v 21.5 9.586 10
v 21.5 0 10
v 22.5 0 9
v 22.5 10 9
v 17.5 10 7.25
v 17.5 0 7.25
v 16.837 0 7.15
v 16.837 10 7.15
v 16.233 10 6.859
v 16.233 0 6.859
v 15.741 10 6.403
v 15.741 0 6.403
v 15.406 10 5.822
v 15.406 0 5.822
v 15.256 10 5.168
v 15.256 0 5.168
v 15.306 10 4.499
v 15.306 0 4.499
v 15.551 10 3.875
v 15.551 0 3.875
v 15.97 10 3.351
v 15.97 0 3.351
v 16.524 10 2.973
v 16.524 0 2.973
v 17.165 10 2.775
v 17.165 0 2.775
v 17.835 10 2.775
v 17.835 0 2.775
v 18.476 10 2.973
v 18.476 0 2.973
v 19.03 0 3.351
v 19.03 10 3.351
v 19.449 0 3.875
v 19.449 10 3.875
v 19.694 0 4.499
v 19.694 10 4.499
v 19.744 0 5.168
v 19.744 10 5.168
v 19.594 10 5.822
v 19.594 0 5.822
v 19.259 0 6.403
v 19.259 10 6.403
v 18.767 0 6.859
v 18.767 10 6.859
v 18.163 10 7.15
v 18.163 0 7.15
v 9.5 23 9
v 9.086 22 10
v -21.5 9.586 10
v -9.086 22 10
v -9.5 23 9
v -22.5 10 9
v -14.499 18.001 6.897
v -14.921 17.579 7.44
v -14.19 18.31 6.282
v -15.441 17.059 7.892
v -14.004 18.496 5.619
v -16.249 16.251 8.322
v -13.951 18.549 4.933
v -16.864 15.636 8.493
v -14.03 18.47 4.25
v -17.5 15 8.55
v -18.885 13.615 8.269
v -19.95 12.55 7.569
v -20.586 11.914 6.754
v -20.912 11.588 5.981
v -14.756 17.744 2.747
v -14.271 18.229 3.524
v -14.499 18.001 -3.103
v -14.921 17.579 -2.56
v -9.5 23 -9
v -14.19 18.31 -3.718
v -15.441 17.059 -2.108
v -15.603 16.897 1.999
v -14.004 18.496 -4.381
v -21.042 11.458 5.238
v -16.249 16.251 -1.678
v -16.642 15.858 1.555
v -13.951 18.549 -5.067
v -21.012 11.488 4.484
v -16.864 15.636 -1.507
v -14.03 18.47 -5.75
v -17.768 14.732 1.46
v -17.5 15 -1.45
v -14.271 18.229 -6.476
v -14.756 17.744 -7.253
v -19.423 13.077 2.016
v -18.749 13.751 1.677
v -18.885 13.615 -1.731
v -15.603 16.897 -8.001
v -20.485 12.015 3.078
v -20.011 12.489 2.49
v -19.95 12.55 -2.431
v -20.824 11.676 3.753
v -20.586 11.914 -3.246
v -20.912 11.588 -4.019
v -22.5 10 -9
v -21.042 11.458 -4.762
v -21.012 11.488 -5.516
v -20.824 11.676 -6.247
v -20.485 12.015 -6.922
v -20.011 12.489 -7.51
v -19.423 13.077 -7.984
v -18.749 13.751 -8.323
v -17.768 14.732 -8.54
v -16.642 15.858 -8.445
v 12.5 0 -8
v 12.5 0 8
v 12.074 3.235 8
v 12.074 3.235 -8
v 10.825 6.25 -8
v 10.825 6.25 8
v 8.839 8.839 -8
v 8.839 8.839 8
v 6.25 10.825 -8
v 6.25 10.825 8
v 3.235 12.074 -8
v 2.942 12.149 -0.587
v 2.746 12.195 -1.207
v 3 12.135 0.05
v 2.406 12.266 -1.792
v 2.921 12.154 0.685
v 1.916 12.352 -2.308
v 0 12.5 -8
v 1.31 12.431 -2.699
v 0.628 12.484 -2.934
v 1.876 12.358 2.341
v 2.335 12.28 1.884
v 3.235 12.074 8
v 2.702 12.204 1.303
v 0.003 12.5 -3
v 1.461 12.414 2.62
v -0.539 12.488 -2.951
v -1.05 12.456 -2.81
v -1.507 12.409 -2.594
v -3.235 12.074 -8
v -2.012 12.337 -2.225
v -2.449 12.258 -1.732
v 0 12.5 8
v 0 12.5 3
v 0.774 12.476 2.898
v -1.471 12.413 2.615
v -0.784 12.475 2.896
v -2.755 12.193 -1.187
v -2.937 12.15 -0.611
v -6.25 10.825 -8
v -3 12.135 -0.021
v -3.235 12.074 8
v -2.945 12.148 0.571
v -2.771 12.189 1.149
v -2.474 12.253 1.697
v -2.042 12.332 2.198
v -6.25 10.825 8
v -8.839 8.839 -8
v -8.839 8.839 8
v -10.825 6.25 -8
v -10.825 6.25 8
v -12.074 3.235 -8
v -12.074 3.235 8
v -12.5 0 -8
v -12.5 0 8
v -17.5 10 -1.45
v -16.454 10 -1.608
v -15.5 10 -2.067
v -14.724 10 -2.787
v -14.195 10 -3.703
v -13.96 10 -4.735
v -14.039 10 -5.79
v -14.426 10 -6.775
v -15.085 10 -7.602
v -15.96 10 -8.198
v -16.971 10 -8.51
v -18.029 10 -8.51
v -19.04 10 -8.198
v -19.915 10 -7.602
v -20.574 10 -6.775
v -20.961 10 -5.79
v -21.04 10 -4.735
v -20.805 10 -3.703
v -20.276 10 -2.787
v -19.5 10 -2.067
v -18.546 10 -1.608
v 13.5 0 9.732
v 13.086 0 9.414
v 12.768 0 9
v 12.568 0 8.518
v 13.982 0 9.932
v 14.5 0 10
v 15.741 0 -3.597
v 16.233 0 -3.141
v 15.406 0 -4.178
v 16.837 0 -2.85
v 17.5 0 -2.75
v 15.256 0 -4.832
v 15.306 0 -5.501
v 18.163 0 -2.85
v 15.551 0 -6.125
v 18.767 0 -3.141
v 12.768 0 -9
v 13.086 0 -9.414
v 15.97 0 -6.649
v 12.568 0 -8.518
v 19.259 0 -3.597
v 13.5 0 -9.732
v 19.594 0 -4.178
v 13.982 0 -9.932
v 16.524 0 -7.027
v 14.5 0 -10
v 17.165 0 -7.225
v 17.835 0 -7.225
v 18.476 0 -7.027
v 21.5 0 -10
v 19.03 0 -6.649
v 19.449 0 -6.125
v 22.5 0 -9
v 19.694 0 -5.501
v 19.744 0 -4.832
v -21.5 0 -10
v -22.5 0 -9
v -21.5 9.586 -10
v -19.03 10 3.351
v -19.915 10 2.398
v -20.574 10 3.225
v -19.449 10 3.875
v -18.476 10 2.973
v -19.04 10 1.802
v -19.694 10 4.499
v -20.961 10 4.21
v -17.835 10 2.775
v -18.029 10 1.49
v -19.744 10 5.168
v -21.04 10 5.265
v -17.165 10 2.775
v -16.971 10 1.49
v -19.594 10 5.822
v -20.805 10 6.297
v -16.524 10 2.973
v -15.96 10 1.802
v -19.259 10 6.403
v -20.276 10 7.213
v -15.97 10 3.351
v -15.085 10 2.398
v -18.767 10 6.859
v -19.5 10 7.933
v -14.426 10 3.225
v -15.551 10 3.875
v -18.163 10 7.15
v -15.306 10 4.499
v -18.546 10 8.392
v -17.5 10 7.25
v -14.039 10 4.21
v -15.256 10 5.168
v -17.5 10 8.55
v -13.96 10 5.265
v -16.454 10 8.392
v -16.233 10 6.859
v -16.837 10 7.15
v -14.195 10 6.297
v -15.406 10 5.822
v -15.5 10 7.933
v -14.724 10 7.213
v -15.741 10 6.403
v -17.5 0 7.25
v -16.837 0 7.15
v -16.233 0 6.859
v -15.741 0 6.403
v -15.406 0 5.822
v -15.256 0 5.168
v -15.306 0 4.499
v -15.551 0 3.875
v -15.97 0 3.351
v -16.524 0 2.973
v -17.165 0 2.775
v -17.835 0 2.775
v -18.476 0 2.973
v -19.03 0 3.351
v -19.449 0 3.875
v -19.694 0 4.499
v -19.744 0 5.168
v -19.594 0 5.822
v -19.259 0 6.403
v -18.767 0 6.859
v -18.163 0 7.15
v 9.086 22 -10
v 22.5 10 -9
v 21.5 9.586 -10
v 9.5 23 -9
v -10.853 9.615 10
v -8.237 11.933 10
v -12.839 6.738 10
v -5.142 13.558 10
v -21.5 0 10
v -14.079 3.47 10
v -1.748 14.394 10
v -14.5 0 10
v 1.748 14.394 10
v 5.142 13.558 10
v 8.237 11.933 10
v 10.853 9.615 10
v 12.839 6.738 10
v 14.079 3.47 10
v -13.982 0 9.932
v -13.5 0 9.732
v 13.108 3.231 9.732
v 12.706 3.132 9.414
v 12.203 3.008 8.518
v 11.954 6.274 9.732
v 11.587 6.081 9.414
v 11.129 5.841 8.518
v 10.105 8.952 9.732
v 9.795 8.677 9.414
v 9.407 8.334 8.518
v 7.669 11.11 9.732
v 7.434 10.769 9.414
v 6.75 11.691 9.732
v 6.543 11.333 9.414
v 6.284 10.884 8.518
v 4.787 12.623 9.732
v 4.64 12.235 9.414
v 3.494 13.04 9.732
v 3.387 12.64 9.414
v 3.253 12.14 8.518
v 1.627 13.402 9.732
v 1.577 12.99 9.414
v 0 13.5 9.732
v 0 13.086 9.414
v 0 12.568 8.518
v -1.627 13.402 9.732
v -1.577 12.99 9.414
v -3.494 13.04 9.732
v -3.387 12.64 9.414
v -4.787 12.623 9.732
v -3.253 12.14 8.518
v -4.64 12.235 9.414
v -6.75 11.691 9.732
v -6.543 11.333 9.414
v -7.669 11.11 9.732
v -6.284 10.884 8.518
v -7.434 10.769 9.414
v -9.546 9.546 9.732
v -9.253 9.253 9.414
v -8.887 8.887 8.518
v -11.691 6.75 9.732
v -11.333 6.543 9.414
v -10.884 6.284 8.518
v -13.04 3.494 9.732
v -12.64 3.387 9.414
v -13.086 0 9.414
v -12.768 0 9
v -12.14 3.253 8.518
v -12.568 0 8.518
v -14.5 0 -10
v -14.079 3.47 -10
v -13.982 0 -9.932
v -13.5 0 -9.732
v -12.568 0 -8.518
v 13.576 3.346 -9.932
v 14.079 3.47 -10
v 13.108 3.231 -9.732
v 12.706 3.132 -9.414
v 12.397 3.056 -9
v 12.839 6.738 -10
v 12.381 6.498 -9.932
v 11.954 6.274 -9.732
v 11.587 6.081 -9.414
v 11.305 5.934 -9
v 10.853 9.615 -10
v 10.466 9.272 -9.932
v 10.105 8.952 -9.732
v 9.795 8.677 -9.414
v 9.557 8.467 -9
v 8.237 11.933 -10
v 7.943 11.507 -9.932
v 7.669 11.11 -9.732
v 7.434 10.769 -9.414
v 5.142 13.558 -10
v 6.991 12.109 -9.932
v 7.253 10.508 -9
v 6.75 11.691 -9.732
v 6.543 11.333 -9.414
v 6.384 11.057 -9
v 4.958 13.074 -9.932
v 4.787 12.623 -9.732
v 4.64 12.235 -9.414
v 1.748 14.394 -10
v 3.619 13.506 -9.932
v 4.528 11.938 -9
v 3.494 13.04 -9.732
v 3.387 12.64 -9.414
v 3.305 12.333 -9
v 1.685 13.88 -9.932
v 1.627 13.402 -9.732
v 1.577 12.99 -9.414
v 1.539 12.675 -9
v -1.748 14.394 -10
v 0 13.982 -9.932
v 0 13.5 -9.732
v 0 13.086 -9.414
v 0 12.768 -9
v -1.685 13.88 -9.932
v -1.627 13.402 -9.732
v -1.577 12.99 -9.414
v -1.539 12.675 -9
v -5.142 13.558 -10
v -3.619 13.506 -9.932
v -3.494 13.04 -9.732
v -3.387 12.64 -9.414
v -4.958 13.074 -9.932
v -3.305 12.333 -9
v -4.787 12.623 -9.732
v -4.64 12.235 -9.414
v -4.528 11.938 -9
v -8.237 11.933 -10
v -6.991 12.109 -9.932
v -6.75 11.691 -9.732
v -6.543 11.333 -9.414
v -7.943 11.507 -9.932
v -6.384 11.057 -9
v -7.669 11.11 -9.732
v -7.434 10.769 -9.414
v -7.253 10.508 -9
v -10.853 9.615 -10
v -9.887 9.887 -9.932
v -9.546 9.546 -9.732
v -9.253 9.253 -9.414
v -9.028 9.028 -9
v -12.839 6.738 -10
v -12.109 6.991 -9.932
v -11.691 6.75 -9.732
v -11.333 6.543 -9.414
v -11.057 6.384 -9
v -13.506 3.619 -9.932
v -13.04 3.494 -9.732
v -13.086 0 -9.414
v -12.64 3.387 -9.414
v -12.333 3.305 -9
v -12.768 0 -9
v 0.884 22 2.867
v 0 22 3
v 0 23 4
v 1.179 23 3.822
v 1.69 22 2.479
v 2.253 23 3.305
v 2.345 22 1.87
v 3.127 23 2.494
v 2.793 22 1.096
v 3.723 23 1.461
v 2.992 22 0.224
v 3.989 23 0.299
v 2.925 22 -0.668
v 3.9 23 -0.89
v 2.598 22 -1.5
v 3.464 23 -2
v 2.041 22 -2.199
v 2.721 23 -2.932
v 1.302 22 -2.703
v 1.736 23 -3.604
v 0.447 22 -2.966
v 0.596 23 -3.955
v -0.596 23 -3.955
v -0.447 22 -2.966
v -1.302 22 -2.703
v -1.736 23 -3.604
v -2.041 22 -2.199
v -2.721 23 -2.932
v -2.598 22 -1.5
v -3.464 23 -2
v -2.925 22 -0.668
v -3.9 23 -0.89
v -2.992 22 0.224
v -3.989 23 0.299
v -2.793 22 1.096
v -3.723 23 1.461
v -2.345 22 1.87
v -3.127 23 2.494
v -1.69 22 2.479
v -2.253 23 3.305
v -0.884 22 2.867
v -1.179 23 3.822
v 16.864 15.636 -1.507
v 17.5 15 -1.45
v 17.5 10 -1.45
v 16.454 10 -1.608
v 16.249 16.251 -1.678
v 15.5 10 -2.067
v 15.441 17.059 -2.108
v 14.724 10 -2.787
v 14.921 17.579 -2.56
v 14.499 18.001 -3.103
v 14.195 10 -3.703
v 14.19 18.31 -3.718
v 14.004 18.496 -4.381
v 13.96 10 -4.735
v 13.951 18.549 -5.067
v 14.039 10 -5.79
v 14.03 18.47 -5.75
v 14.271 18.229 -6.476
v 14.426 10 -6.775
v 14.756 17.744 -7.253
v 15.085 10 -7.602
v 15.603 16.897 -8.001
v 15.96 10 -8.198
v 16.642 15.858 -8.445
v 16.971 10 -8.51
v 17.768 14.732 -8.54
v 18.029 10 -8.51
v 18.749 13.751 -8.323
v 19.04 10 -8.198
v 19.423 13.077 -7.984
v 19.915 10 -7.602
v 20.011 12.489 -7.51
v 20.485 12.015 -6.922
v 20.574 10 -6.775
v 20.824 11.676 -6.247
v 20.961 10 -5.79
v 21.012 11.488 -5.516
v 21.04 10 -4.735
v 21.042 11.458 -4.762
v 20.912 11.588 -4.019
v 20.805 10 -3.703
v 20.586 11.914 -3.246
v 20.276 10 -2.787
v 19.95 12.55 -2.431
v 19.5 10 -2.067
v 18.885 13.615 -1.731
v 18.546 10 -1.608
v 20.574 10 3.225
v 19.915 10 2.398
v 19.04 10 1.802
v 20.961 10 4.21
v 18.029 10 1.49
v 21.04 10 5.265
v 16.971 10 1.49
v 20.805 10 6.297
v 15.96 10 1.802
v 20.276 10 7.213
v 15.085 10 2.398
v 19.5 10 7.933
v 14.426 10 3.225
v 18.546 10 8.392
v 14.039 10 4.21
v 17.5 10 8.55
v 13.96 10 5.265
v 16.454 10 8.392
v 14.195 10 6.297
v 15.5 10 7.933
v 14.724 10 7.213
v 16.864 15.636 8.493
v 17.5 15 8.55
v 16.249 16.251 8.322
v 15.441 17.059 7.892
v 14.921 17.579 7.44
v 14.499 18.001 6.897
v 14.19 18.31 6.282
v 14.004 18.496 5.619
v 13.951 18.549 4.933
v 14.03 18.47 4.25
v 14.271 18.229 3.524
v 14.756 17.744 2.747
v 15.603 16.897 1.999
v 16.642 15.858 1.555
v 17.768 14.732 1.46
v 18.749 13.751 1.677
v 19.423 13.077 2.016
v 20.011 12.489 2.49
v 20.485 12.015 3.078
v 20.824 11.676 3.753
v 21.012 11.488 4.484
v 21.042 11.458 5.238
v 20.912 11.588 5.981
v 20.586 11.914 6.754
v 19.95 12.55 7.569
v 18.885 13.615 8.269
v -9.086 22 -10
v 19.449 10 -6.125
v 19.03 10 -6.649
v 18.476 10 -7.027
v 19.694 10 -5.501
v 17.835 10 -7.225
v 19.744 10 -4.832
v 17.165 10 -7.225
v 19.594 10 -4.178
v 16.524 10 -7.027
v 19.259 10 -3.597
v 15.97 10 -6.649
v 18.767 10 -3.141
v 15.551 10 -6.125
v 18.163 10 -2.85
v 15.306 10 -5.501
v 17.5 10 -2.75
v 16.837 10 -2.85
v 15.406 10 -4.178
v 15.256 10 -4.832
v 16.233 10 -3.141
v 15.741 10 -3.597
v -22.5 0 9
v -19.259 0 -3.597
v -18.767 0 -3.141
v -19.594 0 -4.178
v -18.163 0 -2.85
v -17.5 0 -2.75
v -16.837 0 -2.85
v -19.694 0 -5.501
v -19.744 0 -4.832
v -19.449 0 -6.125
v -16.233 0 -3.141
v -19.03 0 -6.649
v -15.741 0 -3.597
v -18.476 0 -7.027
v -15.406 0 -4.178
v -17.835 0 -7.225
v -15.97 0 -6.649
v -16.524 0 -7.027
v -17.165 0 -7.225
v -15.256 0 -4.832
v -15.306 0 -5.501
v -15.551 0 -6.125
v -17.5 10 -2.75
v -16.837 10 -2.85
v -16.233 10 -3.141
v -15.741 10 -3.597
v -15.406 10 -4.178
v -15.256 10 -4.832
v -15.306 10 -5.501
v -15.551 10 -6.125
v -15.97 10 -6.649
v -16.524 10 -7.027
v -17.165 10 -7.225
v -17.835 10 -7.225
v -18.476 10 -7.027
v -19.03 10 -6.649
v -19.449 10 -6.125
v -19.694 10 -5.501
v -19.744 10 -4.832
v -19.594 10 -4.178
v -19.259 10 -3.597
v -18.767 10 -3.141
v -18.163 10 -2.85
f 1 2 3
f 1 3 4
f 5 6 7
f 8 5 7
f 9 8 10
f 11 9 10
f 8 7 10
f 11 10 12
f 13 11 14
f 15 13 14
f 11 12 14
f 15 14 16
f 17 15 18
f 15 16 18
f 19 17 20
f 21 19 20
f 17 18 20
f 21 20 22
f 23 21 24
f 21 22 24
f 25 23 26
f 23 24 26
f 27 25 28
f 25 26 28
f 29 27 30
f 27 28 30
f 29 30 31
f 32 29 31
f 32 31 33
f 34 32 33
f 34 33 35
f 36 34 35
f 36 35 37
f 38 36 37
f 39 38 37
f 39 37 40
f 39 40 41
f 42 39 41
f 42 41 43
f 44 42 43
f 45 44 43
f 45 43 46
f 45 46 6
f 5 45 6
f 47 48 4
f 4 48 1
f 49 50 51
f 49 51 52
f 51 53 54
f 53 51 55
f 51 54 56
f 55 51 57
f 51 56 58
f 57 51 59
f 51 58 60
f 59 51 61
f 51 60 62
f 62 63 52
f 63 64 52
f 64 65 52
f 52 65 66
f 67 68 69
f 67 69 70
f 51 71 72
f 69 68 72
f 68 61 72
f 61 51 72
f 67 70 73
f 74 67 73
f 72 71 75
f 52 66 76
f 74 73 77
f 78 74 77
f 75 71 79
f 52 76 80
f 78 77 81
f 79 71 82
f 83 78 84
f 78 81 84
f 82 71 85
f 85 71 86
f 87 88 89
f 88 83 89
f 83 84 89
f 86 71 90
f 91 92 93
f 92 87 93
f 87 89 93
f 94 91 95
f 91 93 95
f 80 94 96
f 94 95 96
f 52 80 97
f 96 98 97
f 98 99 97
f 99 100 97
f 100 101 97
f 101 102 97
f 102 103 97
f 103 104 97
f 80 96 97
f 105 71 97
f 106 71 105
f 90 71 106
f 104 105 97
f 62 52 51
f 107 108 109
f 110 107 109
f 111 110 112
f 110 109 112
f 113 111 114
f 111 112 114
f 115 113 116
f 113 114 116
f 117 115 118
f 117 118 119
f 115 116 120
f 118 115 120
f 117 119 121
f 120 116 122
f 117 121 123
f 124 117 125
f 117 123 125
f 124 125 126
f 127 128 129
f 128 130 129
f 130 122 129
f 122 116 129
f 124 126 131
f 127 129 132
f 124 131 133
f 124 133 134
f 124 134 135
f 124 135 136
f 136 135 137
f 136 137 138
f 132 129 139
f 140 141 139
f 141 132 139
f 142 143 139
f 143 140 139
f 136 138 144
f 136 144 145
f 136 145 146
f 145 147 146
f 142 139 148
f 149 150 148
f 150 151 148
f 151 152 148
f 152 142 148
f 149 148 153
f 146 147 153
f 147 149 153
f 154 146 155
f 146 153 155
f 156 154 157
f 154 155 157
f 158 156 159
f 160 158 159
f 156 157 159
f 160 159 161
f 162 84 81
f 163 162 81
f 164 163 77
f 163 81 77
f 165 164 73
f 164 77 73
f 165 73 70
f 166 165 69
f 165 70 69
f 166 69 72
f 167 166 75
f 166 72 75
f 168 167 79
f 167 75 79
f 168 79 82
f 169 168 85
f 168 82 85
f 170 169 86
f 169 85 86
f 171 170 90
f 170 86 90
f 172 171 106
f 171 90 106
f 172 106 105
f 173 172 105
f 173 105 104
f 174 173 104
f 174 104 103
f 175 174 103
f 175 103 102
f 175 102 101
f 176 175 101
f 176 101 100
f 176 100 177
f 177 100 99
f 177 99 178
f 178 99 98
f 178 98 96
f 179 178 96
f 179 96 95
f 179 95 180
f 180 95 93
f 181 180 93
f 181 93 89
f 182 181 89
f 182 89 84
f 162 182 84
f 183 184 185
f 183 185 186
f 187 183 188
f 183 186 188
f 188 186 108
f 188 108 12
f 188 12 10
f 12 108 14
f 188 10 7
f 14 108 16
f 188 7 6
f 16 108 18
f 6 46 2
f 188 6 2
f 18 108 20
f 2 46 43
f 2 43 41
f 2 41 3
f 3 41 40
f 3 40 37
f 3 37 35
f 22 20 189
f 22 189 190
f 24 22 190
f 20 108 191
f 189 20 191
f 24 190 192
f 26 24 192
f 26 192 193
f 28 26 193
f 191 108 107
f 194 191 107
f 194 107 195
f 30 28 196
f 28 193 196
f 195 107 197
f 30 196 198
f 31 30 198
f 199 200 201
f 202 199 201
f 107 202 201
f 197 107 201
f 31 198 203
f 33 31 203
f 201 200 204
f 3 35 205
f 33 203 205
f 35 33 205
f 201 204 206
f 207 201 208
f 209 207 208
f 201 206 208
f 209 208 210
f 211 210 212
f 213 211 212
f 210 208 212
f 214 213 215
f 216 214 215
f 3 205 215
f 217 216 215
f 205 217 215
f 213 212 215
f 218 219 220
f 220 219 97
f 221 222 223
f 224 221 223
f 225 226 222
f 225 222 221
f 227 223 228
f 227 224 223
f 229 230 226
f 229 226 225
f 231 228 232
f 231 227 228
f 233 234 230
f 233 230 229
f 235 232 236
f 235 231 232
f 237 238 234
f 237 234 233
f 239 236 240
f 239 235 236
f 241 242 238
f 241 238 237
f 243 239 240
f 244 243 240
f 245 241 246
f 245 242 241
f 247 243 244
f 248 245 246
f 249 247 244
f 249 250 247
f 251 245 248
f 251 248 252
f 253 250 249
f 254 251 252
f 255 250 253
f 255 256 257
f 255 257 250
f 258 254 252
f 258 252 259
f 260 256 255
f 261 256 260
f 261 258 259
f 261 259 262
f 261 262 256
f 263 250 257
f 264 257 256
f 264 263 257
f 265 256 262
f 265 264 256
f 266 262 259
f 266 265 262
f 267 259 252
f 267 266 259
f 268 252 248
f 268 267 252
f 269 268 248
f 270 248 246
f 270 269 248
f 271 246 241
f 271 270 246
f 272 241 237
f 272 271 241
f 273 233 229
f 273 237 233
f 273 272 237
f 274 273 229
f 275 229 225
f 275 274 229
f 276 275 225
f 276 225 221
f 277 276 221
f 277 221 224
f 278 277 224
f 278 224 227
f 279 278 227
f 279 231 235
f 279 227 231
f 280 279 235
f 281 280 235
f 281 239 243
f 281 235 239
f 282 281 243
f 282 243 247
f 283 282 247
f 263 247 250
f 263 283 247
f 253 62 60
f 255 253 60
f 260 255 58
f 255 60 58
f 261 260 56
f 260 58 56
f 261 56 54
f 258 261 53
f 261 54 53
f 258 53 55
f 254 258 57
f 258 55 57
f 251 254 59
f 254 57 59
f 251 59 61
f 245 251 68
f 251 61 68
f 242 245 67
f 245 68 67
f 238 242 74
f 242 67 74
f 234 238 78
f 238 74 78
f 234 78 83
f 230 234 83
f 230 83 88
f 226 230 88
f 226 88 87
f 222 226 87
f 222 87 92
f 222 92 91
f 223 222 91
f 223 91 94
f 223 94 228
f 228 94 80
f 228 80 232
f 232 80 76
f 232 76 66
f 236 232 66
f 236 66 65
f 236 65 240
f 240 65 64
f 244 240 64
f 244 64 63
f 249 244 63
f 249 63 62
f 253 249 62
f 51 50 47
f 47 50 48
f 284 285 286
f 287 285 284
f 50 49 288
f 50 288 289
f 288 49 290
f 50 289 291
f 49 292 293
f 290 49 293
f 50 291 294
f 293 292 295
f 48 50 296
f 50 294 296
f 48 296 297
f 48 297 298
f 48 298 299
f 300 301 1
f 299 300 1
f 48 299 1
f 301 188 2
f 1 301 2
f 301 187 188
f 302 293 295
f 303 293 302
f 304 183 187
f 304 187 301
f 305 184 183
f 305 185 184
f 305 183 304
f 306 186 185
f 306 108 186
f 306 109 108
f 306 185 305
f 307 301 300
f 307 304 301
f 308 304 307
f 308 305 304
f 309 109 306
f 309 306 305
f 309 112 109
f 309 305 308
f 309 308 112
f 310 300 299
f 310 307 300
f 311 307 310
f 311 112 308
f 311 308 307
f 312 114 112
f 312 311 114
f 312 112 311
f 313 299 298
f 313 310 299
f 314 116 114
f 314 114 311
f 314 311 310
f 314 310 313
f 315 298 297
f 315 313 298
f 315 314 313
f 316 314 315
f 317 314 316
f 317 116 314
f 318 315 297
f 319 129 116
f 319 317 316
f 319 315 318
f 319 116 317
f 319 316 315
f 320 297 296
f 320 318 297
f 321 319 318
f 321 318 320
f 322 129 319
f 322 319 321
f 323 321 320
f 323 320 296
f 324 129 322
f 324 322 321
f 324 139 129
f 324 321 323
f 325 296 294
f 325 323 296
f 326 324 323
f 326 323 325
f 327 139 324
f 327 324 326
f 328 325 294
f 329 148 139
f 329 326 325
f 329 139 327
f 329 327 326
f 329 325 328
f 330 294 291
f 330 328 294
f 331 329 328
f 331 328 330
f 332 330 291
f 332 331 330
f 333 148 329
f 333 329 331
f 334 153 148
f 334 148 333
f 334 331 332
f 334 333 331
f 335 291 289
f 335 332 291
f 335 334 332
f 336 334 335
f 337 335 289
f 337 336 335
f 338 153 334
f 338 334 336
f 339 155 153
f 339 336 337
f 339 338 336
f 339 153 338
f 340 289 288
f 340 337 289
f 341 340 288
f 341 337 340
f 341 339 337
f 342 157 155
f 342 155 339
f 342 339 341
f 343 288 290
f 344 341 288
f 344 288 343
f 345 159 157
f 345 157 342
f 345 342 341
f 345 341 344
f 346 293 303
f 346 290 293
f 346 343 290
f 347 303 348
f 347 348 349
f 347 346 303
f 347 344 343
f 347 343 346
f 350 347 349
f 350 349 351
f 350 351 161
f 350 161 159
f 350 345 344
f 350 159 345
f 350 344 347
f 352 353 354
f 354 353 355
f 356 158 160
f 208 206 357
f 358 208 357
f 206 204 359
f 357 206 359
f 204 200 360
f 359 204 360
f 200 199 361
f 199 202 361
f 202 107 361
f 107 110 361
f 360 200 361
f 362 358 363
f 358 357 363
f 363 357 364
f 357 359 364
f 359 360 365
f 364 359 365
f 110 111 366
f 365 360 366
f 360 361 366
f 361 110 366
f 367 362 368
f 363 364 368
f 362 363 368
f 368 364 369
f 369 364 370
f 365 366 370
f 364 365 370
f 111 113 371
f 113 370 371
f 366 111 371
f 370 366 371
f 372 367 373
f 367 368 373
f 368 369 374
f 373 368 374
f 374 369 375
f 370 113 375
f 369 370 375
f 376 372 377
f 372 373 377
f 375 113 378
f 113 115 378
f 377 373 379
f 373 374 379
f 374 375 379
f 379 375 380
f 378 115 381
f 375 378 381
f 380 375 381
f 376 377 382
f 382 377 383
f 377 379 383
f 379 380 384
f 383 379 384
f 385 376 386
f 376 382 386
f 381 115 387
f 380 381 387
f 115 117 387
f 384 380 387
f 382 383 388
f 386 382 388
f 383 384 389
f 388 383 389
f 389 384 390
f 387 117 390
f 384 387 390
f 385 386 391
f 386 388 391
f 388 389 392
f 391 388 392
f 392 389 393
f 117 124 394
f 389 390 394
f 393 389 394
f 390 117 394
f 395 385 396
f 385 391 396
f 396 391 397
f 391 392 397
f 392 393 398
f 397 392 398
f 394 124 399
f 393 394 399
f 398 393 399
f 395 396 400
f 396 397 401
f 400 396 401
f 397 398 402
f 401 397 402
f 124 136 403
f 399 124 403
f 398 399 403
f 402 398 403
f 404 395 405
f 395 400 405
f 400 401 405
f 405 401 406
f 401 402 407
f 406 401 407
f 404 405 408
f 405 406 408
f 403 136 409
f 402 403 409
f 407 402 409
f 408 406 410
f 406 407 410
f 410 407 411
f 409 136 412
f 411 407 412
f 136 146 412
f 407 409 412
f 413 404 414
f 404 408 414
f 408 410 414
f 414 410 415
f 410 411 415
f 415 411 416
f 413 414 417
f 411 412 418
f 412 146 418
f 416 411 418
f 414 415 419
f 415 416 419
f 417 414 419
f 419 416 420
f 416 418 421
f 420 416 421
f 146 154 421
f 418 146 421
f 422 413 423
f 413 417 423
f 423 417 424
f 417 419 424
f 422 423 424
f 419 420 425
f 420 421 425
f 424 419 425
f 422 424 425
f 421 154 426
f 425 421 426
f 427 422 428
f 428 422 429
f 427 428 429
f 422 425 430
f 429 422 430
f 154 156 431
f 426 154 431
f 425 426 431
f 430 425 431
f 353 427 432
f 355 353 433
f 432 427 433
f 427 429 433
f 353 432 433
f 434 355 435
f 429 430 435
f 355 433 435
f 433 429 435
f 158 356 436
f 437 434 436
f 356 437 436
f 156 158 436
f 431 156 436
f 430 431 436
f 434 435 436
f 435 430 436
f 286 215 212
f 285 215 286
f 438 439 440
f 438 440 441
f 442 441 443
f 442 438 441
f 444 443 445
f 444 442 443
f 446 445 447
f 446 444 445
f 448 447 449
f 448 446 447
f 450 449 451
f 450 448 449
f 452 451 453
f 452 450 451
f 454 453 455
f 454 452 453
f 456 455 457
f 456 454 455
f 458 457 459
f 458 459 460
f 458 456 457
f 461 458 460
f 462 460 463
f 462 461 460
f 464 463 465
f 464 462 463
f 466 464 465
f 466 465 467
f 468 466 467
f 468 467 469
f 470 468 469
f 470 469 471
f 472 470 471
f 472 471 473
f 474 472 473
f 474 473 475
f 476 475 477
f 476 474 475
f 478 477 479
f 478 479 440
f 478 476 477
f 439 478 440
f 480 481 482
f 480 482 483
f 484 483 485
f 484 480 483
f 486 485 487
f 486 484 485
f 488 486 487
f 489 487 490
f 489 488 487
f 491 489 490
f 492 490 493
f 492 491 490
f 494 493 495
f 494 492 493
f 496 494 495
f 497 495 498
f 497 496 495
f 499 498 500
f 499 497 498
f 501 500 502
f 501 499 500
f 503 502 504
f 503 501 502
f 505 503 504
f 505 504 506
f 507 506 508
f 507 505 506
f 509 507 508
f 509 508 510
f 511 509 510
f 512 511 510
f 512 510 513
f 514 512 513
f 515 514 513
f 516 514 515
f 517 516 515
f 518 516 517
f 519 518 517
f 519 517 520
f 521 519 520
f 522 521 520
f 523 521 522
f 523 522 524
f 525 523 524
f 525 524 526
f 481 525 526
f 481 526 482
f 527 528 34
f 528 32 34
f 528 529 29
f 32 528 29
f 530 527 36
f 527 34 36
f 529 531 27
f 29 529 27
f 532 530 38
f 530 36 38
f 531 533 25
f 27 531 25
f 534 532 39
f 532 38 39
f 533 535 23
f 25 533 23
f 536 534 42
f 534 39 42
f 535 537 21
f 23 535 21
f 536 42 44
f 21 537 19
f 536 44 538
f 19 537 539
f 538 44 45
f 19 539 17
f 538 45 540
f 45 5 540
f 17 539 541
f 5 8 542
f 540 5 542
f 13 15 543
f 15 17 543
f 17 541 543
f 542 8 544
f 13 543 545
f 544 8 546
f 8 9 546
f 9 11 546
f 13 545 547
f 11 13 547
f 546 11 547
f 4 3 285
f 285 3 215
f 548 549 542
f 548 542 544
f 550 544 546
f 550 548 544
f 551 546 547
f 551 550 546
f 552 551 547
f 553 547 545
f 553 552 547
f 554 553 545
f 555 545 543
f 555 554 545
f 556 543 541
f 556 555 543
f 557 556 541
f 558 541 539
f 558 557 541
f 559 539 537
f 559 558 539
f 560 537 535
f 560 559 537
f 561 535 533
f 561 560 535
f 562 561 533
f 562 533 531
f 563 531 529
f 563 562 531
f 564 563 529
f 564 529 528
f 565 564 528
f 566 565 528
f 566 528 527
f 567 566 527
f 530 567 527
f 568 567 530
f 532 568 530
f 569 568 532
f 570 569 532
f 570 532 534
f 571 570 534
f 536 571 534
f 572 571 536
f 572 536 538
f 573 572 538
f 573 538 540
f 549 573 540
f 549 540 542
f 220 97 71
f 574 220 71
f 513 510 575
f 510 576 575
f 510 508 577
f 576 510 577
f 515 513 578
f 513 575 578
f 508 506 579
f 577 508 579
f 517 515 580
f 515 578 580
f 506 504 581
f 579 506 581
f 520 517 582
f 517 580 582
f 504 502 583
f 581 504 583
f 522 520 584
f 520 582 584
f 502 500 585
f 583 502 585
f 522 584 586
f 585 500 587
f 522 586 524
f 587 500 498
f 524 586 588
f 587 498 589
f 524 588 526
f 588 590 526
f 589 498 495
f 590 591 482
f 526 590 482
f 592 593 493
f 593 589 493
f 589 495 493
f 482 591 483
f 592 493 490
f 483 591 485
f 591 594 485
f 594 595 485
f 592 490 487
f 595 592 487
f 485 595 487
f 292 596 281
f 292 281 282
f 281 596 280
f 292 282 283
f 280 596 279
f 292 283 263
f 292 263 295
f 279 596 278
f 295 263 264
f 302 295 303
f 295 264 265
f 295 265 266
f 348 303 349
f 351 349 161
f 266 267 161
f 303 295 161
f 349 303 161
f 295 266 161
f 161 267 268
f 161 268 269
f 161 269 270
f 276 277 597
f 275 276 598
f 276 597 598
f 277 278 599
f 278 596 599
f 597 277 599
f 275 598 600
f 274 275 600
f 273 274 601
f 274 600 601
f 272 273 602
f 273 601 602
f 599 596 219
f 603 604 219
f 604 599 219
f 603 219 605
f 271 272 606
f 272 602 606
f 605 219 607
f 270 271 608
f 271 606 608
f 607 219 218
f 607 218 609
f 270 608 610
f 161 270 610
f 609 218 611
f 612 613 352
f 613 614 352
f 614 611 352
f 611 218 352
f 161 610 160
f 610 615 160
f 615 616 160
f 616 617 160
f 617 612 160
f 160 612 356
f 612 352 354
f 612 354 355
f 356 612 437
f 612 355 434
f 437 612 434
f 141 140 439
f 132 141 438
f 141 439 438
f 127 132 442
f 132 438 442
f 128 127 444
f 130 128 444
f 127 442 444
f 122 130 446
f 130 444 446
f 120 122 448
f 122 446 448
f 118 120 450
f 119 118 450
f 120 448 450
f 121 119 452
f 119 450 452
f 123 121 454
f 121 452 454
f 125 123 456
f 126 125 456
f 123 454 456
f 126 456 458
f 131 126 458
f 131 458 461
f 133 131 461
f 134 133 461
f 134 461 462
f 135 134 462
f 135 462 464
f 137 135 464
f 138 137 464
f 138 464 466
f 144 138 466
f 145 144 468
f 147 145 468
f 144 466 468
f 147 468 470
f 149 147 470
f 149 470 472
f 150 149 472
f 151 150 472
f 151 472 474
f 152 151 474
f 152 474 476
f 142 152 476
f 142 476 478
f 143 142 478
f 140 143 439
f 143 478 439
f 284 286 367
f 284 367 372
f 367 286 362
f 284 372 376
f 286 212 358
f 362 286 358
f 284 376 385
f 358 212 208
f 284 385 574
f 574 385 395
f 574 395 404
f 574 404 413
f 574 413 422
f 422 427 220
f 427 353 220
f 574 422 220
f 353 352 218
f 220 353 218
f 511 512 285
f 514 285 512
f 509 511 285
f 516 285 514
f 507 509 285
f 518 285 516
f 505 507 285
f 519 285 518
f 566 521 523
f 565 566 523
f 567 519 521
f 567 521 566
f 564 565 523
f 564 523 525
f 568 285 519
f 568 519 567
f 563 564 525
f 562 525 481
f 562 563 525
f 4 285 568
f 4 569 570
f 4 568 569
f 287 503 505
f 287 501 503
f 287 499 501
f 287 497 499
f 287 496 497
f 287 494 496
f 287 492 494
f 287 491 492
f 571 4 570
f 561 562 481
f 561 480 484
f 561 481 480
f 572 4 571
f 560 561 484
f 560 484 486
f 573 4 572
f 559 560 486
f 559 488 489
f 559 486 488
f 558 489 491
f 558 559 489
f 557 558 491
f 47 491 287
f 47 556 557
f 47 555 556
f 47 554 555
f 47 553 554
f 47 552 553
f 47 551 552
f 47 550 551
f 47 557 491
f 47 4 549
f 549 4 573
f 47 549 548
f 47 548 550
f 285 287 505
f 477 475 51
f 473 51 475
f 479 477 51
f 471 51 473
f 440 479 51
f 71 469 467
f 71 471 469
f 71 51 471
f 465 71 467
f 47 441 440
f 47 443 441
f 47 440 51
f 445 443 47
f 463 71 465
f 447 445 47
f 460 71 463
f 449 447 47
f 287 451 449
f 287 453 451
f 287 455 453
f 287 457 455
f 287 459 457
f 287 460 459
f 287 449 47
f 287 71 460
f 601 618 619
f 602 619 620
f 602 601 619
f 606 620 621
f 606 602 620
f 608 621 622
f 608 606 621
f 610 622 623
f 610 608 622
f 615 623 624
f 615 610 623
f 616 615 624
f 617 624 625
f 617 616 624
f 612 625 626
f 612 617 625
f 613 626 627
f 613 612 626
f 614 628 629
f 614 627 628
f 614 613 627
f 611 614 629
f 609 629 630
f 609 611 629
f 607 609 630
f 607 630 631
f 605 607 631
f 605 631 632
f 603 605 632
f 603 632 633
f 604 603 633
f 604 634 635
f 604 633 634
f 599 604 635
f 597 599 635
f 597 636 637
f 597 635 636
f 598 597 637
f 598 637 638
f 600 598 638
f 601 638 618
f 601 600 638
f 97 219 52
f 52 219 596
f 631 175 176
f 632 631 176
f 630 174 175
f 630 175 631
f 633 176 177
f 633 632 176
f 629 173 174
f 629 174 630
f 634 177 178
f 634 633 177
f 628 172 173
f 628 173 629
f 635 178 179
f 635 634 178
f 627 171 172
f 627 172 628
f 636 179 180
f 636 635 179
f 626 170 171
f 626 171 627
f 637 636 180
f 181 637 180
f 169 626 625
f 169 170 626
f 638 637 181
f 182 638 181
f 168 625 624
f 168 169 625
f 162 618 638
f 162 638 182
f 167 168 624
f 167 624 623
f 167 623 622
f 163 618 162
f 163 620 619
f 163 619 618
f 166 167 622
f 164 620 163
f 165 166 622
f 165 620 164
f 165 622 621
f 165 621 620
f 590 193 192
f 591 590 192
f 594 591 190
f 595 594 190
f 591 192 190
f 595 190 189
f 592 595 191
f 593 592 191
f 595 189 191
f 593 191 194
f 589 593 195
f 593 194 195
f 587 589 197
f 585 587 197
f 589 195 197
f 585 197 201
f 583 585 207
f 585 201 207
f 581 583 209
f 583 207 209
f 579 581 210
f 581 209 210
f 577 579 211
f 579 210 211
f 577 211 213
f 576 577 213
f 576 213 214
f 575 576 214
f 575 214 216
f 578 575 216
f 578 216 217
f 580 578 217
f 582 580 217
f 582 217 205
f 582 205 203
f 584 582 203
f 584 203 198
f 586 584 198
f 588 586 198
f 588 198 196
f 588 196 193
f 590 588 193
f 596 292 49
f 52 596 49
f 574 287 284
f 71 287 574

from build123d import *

# Parameters (mm, degrees)
BOSS_EXTRUDE1_DEPTH     = 23
CUT_EXTRUDE1_REACH      = 39.885
CUT_EXTRUDE2_REACH      = 35.693
SKETCH3_R               = 2.25
CUT_EXTRUDE3_START      = 23
SKETCH4_R               = 3.55
CUT_EXTRUDE3_DEPTH      = 13
FILLET1_R               = 2
CHAMFER1_SIZE           = 13
CHAMFER2_SIZE           = 1
CUT_EXTRUDE4_REACH      = 35.693
CUT_EXTRUDE4_END_RADIUS = 12.5
SKETCH5_R               = 3
CHAMFER3_SIZE           = 1


with BuildPart() as part:
    # Sketch1 → Boss-Extrude1 (new body)
    with BuildSketch(Plane(origin=(0, 0, 0), x_dir=(1, 0, 0), z_dir=(0, 1, 0))):
        Polygon((0, 10), (-22.5, 10), (-22.5, -10), (22.5, -10), (22.5, 10), align=None)
    extrude(amount=BOSS_EXTRUDE1_DEPTH)

    # Sketch2 → Cut-Extrude1 (cut, up to next)
    with BuildSketch(Plane.XY.offset(10), mode=Mode.PRIVATE) as cut_extrude1_sk1:
        with BuildLine():
            Line((-12.5, 0), (-22.5, 0))
            Line((-22.5, 0), (-22.5, -2.522641864))
            Line((-22.5, -2.522641864), (22.5, -2.522641864))
            Line((22.5, -2.522641864), (22.5, 0))
            Line((22.5, 0), (12.5, 0))
            ThreePointArc((12.5, 0), (0, 12.5), (-12.5, 0))
        make_face()
    cut_extrude1_tool1 = extrude(cut_extrude1_sk1.sketch, amount=-CUT_EXTRUDE1_REACH, mode=Mode.PRIVATE) & part.part
    add(cut_extrude1_tool1.solids().sort_by_distance((0, 3.22853, 10))[0], mode=Mode.SUBTRACT)

    # Sketch3 → Cut-Extrude2 (cut, up to next)
    with BuildSketch(Plane(origin=(0, 0, 0), x_dir=(1, 0, 0), z_dir=(0, 1, 0)), mode=Mode.PRIVATE) as cut_extrude2_sk1:
        with Locations(Location((-17.5, -5, 0), (0, 0, 270))):
            Circle(SKETCH3_R)
    cut_extrude2_tool1 = extrude(cut_extrude2_sk1.sketch, amount=CUT_EXTRUDE2_REACH, mode=Mode.PRIVATE) & part.part
    # Sketch3 → Cut-Extrude2 (cut, up to next)
    with BuildSketch(Plane(origin=(0, 0, 0), x_dir=(1, 0, 0), z_dir=(0, 1, 0)), mode=Mode.PRIVATE) as cut_extrude2_sk2:
        with Locations(Location((-17.5, 5, 0), (0, 0, 270))):
            Circle(SKETCH3_R)
    cut_extrude2_tool2 = extrude(cut_extrude2_sk2.sketch, amount=CUT_EXTRUDE2_REACH, mode=Mode.PRIVATE) & part.part
    cut_extrude2_1 = cut_extrude2_tool1.solids().sort_by_distance((-17.5, 0, 5))[0]
    add(cut_extrude2_1, mode=Mode.SUBTRACT)
    cut_extrude2_2 = cut_extrude2_tool2.solids().sort_by_distance((-17.5, 0, -5))[0]
    add(cut_extrude2_2, mode=Mode.SUBTRACT)
    cut_extrude2 = cut_extrude2_1 + cut_extrude2_2  # Cut-Extrude2 as one shape, for the pattern or mirror that repeats it

    # Mirror1: Cut-Extrude2 across plane
    add(cut_extrude2.mirror(Plane(origin=(0, 0, 0), x_dir=(0, 0, 1), z_dir=(1, 0, 0))), mode=Mode.SUBTRACT)

    # Sketch4 → Cut-Extrude3 (cut)
    with BuildSketch(Plane(origin=(0, 0, 0), x_dir=(1, 0, 0), z_dir=(0, 1, 0)).offset(CUT_EXTRUDE3_START)):
        with Locations(Location((-17.5, 5, 0), (0, 0, 270))):
            Circle(SKETCH4_R)
        with Locations(Location((-17.5, -5, 0), (0, 0, 270))):
            Circle(SKETCH4_R)
    cut_extrude3 = extrude(amount=-CUT_EXTRUDE3_DEPTH, mode=Mode.SUBTRACT)

    # Mirror2: Cut-Extrude3 across plane
    add(cut_extrude3.mirror(Plane(origin=(0, 0, 0), x_dir=(0, 0, 1), z_dir=(1, 0, 0))), mode=Mode.SUBTRACT)

    # Fillet1
    fillet1_edges = [part.edges().sort_by_distance(p)[0] for p in [
        (0, 12.5, 10),
        (0, 12.5, -10),
    ]]
    fillet(fillet1_edges, radius=FILLET1_R)

    # Chamfer1
    # the kernel refuses this chamfer: 13 mm, written as the material it takes off along each edge
    with BuildSketch(Plane(origin=(-22.5, 23, -43.431878844), x_dir=(0.9996219169112968, 0.027495876610586424, 0), z_dir=(0, 0, 1))) as chamfer1_piece_1:
        Polygon((CHAMFER1_SIZE * 0.999621916911, -CHAMFER1_SIZE * 0.0274958766106), (-CHAMFER1_SIZE * 0.0274958766106, -CHAMFER1_SIZE * 0.999621916911), (0, 0), align=None)
    extrude(amount=86.863757687, mode=Mode.SUBTRACT)
    with BuildSketch(Plane(origin=(22.5, 23, 43.431878844), x_dir=(0.027495876610586424, -0.9996219169112968, 0), z_dir=(0, 0, -1))) as chamfer1_piece_2:
        Polygon((CHAMFER1_SIZE * 0.999621916911, CHAMFER1_SIZE * 0.0274958766106), (-CHAMFER1_SIZE * 0.0274958766106, CHAMFER1_SIZE * 0.999621916911), (0, 0), align=None)
    extrude(amount=86.863757687, mode=Mode.SUBTRACT)

    # Chamfer2
    chamfer2_edges = [part.edges().sort_by_distance(p)[0] for p in [
        (0, 23, -10),
        (0, 23, 10),
        (-22.5, 5, -10),
        (22.5, 5, -10),
        (-16, 16.5, -10),
        (16, 16.5, -10),
        (22.5, 5, 10),
        (-22.5, 5, 10),
        (-16, 16.5, 10),
        (16, 16.5, 10),
    ]]
    chamfer(chamfer2_edges, length=CHAMFER2_SIZE)

    # Cut-Extrude4: up to this cylinder (the profile starts outside it)
    cut_extrude4_end = Plane(origin=(0, 0, 0), z_dir=(0, 0, 1)) * Cylinder(CUT_EXTRUDE4_END_RADIUS, 97.386, mode=Mode.PRIVATE)
    # Sketch5 → Cut-Extrude4 (cut, up to the surface)
    with BuildSketch(Plane(origin=(0, 23, 0), x_dir=(1, 0, 0), z_dir=(0, 1, 0)), mode=Mode.PRIVATE) as cut_extrude4_sk1:
        with Locations(Location((0, 0, 0), (0, 0, 270))):
            Circle(SKETCH5_R)
    cut_extrude4_tool1 = extrude(cut_extrude4_sk1.sketch, amount=-CUT_EXTRUDE4_REACH, mode=Mode.PRIVATE) - cut_extrude4_end
    add(cut_extrude4_tool1.solids().sort_by_distance((0, 23, 0))[0], mode=Mode.SUBTRACT)

    # Chamfer3
    chamfer3_edges = [part.edges().sort_by_distance(p)[0] for p in [
        (0, 23, -3),
    ]]
    chamfer(chamfer3_edges, length=CHAMFER3_SIZE)


solid = part.part
